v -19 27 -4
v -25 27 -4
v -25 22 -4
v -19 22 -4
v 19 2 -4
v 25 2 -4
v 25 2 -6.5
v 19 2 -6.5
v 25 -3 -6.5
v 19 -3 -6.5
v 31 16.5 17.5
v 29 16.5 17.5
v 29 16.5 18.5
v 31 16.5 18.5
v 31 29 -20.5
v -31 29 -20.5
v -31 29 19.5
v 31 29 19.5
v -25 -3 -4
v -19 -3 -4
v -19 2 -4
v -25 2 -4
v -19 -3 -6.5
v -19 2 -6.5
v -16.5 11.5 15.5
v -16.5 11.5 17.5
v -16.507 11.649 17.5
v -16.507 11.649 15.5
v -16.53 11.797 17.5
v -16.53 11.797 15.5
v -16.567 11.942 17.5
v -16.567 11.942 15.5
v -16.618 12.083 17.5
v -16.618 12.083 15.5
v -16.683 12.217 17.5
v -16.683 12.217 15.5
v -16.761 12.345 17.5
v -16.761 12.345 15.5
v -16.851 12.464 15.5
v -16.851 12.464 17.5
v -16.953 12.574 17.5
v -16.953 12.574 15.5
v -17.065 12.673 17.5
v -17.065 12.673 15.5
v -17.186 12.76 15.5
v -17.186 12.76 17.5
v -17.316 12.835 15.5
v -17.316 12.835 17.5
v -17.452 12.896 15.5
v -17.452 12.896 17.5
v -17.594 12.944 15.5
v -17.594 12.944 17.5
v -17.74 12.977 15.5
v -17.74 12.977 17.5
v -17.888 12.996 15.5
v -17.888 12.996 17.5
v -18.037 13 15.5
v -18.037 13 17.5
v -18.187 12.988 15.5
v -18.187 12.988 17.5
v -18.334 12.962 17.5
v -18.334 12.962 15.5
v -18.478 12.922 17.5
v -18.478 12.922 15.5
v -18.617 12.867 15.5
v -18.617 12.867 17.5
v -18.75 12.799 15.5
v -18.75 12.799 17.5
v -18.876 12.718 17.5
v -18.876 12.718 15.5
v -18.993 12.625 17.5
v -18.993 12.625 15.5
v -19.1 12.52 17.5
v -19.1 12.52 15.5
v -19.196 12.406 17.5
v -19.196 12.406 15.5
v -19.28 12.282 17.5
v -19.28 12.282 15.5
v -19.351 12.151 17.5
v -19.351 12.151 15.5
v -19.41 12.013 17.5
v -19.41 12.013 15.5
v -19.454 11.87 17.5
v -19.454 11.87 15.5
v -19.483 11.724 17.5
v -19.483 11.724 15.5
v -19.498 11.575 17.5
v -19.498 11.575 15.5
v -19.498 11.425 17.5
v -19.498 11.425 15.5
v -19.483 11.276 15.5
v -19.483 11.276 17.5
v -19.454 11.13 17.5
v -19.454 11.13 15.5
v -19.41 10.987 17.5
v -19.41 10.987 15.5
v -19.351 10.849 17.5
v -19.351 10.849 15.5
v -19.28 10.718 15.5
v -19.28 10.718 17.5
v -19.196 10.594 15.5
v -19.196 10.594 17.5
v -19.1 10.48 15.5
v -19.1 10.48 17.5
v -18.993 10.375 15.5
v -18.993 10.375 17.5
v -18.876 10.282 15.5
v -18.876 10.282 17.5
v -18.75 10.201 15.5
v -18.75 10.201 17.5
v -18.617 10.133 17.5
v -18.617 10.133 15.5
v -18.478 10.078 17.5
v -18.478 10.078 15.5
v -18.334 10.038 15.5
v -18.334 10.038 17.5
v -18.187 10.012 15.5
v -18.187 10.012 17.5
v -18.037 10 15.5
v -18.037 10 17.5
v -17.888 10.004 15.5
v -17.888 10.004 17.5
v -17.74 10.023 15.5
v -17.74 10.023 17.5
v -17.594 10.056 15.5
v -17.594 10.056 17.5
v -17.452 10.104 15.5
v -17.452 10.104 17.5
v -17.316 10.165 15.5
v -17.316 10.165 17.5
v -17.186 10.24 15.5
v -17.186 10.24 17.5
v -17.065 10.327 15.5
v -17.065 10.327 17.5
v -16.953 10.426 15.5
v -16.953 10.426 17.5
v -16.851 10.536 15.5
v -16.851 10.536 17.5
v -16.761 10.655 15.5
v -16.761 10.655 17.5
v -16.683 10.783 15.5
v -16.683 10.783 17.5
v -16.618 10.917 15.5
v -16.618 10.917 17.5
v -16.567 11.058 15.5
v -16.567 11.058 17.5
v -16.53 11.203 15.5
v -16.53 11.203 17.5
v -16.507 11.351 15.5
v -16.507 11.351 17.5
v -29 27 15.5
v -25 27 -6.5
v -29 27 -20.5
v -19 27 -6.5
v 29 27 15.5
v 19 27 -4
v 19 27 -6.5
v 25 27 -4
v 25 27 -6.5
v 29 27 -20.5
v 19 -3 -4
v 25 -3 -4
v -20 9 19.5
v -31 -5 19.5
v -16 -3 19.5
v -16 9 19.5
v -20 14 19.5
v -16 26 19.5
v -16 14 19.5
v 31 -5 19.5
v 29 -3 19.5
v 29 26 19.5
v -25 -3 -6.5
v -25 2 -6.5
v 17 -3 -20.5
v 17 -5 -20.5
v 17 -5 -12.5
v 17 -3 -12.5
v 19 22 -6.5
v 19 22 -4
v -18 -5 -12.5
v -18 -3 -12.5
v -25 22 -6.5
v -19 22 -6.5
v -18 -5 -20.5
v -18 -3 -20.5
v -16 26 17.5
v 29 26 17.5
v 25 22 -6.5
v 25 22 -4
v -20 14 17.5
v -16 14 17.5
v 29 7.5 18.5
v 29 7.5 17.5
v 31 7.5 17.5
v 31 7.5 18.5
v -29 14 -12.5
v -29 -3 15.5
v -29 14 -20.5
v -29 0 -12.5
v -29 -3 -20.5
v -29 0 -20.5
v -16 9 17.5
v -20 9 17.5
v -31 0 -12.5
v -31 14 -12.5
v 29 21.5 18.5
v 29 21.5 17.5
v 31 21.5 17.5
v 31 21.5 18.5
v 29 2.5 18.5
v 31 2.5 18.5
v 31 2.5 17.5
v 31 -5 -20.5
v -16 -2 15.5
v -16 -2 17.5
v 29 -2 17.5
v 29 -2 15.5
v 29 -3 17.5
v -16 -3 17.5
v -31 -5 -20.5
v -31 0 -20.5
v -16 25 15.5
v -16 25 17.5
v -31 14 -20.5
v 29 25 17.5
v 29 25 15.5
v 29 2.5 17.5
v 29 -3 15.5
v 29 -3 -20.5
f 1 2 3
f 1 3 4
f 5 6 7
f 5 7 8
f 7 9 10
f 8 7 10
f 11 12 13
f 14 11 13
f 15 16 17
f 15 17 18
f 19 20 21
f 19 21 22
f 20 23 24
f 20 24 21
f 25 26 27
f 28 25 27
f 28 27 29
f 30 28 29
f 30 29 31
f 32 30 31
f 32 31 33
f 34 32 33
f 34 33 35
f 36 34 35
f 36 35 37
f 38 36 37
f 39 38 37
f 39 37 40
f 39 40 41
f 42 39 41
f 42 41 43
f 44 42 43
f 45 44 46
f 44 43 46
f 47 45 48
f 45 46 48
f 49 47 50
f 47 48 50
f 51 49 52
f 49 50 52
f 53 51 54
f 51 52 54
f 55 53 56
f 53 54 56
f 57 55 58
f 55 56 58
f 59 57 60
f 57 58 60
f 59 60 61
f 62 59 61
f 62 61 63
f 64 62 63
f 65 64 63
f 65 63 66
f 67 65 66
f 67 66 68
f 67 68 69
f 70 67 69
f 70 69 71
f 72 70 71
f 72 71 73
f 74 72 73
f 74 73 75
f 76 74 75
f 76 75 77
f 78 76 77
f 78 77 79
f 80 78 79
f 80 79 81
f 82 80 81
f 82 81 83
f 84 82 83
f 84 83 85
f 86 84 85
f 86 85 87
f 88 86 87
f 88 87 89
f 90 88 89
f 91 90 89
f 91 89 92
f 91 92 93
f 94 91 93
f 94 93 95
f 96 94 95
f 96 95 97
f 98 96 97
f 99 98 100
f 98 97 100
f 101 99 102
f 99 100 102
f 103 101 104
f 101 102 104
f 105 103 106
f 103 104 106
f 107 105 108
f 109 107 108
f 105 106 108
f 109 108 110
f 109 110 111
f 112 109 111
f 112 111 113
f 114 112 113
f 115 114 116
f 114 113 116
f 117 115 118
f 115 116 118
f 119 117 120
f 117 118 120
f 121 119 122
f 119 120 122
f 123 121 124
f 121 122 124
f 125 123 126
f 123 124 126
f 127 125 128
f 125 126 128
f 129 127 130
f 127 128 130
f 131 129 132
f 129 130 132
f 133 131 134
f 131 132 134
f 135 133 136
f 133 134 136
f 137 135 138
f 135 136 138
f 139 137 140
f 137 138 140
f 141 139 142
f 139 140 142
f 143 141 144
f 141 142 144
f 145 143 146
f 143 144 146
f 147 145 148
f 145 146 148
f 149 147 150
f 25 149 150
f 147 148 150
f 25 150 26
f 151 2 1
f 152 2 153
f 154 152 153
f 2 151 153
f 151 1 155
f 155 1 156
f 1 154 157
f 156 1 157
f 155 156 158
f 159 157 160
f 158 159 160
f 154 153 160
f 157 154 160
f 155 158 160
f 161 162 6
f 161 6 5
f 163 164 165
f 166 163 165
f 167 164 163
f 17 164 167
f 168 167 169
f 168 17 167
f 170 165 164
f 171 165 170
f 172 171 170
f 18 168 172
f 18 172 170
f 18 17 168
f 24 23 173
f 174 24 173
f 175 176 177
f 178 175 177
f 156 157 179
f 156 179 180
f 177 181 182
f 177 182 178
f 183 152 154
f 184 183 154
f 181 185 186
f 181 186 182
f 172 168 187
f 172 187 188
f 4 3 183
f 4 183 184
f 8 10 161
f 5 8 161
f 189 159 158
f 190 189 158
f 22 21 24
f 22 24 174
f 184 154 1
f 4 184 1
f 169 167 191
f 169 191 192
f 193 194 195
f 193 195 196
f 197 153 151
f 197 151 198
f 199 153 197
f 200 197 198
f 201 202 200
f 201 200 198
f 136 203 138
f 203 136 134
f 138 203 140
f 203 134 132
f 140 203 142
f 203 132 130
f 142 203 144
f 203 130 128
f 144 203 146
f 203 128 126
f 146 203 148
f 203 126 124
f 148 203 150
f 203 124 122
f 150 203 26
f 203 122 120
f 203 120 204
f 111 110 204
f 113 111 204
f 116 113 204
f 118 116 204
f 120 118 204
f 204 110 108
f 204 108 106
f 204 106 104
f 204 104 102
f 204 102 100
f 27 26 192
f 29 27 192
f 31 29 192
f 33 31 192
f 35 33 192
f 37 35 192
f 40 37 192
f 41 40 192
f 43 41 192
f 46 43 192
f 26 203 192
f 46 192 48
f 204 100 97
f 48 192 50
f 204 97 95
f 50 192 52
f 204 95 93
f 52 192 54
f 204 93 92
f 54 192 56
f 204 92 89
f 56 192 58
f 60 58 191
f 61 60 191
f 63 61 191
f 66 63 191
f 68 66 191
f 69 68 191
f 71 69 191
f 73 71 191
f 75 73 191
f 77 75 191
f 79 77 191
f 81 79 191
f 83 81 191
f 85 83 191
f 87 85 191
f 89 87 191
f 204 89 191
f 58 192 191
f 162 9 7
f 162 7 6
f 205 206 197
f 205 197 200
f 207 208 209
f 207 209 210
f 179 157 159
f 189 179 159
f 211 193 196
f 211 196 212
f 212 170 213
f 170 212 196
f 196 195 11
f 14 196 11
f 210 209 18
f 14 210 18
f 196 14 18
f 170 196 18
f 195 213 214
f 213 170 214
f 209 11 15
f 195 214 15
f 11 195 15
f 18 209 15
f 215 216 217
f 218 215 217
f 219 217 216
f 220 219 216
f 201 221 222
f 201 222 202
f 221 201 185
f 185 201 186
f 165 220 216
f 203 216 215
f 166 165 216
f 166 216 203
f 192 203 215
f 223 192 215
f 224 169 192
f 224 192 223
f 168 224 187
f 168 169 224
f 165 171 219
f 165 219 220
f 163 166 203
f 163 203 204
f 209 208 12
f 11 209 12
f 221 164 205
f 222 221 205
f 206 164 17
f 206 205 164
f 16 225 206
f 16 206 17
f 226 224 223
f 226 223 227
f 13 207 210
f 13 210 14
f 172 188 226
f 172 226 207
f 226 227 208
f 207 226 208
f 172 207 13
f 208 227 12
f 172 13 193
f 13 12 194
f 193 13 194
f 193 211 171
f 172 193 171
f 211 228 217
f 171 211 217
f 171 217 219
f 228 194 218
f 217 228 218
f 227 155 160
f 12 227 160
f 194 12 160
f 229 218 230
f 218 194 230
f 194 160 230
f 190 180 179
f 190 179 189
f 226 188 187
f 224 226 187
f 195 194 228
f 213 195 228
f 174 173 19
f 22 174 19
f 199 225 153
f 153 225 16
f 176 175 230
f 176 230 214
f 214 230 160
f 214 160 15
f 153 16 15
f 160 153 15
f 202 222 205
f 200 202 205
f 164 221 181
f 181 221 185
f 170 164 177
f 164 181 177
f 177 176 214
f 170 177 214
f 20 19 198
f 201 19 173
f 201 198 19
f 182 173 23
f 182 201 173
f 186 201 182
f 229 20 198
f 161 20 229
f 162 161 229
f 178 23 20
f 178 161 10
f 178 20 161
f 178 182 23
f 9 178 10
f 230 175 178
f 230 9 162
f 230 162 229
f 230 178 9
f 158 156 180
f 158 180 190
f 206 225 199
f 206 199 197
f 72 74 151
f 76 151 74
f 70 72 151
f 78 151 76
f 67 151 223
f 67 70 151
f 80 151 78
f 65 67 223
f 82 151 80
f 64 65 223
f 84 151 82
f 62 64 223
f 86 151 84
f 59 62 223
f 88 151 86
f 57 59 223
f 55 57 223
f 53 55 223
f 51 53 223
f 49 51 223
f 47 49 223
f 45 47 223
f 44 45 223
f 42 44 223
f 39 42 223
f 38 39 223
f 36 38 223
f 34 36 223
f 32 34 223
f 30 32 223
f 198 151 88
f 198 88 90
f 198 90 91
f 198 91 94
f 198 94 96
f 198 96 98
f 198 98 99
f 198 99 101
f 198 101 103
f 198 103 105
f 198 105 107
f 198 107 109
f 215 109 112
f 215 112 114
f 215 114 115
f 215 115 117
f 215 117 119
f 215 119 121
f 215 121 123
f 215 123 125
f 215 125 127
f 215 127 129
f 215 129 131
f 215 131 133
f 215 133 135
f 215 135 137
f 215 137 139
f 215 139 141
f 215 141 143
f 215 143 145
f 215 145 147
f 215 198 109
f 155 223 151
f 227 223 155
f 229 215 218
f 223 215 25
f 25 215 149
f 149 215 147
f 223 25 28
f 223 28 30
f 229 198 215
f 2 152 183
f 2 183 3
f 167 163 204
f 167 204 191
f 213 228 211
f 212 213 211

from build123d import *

# Parameters (mm, degrees)
SKETCH_W        = 62
SKETCH_H        = 34
PAD_DEPTH       = 40
SKETCH001_W     = 58
SKETCH001_H     = 30
POCKET_DEPTH    = 36
SKETCH002_W     = 45
SKETCH002_H     = 27
POCKET001_DEPTH = 5
POCKET002_DEPTH = 2
SKETCH004_R     = 1.5
POCKET003_DEPTH = 5
SKETCH005_W     = 5
SKETCH005_H     = 1
POCKET004_DEPTH = 5
SKETCH006_W     = 6
SKETCH006_H     = 2.5
PAD001_DEPTH    = 5
SKETCH007_W     = 6
SKETCH007_H     = 2.5
PAD002_DEPTH    = 5
SKETCH008_W     = 14
SKETCH008_H     = 8
POCKET005_DEPTH = 5
SKETCH009_W     = 35
SKETCH009_H     = 8
POCKET006_DEPTH = 5


with BuildPart() as part:
    # Sketch → Pad (new body)
    with BuildSketch(Plane.XY.offset(16)):
        with Locations((0, 12)):
            Rectangle(SKETCH_W, SKETCH_H)
    extrude(amount=PAD_DEPTH)

    # Sketch001 (on Face5 of Pad) → Pocket (cut)
    with BuildSketch(Plane(origin=(0, 0, 16), x_dir=(1, 0, 0), z_dir=(0, 0, -1))):
        with Locations((0, -12)):
            Rectangle(SKETCH001_W, SKETCH001_H)
    extrude(amount=-POCKET_DEPTH, mode=Mode.SUBTRACT)

    # Sketch002 (on Face5 of Pocket) → Pocket001 (cut)
    with BuildSketch(Plane.XY.offset(56)):
        with Locations((6.5, 11.5)):
            Rectangle(SKETCH002_W, SKETCH002_H)
    extrude(amount=-POCKET001_DEPTH, mode=Mode.SUBTRACT)

    # Sketch003 (on Face5 of Pocket001) → Pocket002 (cut)
    with BuildSketch(Plane.XY.offset(56)):
        Polygon((-16, 26), (29, 26), (29, -3), (-16, -3), (-16, 9), (-20, 9), (-20, 14), (-16, 14), align=None)
    extrude(amount=-POCKET002_DEPTH, mode=Mode.SUBTRACT)

    # Sketch004 (on Face29 of Pocket002) → Pocket003 (cut)
    with BuildSketch(Plane.XY.offset(54)):
        with Locations((-18, 11.5)):
            Circle(SKETCH004_R)
    extrude(amount=-POCKET003_DEPTH, mode=Mode.SUBTRACT)

    # Sketch005 (on Face14 of Pocket003) → Pocket004 (cut)
    with BuildSketch(Plane(origin=(29, 0, 0), x_dir=(0, -1, 0), z_dir=(-1, 0, 0))):
        with Locations((-19, 54.5)):
            Rectangle(SKETCH005_W, SKETCH005_H)
        with Locations((-5, 54.5)):
            Rectangle(SKETCH005_W, SKETCH005_H)
    extrude(amount=-POCKET004_DEPTH, mode=Mode.SUBTRACT)

    # Sketch006 (on Face18 of Pocket004) → Pad001 (join)
    with BuildSketch(Plane.XZ.offset(-27)):
        with Locations((-22, 31.25)):
            Rectangle(SKETCH006_W, SKETCH006_H)
        with Locations((22, 31.25)):
            Rectangle(SKETCH006_W, SKETCH006_H)
    extrude(amount=PAD001_DEPTH)

    # Sketch007 (on Face16 of Pad001) → Pad002 (join)
    with BuildSketch(Plane(origin=(0, -3, 0), x_dir=(-1, 0, 0), z_dir=(0, 1, 0))):
        with Locations((-22, 31.25)):
            Rectangle(SKETCH007_W, SKETCH007_H)
        with Locations((22, 31.25)):
            Rectangle(SKETCH007_W, SKETCH007_H)
    extrude(amount=PAD002_DEPTH)

    # Sketch008 (on Face2 of Pad002) → Pocket005 (cut)
    with BuildSketch(Plane(origin=(-31, 0, 0), x_dir=(0, -1, 0), z_dir=(-1, 0, 0))):
        with Locations((-7, 20)):
            Rectangle(SKETCH008_W, SKETCH008_H)
    extrude(amount=-POCKET005_DEPTH, mode=Mode.SUBTRACT)

    # Sketch009 (on Face9 of Pocket005) → Pocket006 (cut)
    with BuildSketch(Plane.XZ.offset(5)):
        with Locations((-0.5, 20)):
            Rectangle(SKETCH009_W, SKETCH009_H)
    extrude(amount=-POCKET006_DEPTH, mode=Mode.SUBTRACT)


with BuildPart() as part_1:
    # Body placement: moved
    add(part.part.moved(Location((0, 0, -36.5))))


solid = part_1.part
